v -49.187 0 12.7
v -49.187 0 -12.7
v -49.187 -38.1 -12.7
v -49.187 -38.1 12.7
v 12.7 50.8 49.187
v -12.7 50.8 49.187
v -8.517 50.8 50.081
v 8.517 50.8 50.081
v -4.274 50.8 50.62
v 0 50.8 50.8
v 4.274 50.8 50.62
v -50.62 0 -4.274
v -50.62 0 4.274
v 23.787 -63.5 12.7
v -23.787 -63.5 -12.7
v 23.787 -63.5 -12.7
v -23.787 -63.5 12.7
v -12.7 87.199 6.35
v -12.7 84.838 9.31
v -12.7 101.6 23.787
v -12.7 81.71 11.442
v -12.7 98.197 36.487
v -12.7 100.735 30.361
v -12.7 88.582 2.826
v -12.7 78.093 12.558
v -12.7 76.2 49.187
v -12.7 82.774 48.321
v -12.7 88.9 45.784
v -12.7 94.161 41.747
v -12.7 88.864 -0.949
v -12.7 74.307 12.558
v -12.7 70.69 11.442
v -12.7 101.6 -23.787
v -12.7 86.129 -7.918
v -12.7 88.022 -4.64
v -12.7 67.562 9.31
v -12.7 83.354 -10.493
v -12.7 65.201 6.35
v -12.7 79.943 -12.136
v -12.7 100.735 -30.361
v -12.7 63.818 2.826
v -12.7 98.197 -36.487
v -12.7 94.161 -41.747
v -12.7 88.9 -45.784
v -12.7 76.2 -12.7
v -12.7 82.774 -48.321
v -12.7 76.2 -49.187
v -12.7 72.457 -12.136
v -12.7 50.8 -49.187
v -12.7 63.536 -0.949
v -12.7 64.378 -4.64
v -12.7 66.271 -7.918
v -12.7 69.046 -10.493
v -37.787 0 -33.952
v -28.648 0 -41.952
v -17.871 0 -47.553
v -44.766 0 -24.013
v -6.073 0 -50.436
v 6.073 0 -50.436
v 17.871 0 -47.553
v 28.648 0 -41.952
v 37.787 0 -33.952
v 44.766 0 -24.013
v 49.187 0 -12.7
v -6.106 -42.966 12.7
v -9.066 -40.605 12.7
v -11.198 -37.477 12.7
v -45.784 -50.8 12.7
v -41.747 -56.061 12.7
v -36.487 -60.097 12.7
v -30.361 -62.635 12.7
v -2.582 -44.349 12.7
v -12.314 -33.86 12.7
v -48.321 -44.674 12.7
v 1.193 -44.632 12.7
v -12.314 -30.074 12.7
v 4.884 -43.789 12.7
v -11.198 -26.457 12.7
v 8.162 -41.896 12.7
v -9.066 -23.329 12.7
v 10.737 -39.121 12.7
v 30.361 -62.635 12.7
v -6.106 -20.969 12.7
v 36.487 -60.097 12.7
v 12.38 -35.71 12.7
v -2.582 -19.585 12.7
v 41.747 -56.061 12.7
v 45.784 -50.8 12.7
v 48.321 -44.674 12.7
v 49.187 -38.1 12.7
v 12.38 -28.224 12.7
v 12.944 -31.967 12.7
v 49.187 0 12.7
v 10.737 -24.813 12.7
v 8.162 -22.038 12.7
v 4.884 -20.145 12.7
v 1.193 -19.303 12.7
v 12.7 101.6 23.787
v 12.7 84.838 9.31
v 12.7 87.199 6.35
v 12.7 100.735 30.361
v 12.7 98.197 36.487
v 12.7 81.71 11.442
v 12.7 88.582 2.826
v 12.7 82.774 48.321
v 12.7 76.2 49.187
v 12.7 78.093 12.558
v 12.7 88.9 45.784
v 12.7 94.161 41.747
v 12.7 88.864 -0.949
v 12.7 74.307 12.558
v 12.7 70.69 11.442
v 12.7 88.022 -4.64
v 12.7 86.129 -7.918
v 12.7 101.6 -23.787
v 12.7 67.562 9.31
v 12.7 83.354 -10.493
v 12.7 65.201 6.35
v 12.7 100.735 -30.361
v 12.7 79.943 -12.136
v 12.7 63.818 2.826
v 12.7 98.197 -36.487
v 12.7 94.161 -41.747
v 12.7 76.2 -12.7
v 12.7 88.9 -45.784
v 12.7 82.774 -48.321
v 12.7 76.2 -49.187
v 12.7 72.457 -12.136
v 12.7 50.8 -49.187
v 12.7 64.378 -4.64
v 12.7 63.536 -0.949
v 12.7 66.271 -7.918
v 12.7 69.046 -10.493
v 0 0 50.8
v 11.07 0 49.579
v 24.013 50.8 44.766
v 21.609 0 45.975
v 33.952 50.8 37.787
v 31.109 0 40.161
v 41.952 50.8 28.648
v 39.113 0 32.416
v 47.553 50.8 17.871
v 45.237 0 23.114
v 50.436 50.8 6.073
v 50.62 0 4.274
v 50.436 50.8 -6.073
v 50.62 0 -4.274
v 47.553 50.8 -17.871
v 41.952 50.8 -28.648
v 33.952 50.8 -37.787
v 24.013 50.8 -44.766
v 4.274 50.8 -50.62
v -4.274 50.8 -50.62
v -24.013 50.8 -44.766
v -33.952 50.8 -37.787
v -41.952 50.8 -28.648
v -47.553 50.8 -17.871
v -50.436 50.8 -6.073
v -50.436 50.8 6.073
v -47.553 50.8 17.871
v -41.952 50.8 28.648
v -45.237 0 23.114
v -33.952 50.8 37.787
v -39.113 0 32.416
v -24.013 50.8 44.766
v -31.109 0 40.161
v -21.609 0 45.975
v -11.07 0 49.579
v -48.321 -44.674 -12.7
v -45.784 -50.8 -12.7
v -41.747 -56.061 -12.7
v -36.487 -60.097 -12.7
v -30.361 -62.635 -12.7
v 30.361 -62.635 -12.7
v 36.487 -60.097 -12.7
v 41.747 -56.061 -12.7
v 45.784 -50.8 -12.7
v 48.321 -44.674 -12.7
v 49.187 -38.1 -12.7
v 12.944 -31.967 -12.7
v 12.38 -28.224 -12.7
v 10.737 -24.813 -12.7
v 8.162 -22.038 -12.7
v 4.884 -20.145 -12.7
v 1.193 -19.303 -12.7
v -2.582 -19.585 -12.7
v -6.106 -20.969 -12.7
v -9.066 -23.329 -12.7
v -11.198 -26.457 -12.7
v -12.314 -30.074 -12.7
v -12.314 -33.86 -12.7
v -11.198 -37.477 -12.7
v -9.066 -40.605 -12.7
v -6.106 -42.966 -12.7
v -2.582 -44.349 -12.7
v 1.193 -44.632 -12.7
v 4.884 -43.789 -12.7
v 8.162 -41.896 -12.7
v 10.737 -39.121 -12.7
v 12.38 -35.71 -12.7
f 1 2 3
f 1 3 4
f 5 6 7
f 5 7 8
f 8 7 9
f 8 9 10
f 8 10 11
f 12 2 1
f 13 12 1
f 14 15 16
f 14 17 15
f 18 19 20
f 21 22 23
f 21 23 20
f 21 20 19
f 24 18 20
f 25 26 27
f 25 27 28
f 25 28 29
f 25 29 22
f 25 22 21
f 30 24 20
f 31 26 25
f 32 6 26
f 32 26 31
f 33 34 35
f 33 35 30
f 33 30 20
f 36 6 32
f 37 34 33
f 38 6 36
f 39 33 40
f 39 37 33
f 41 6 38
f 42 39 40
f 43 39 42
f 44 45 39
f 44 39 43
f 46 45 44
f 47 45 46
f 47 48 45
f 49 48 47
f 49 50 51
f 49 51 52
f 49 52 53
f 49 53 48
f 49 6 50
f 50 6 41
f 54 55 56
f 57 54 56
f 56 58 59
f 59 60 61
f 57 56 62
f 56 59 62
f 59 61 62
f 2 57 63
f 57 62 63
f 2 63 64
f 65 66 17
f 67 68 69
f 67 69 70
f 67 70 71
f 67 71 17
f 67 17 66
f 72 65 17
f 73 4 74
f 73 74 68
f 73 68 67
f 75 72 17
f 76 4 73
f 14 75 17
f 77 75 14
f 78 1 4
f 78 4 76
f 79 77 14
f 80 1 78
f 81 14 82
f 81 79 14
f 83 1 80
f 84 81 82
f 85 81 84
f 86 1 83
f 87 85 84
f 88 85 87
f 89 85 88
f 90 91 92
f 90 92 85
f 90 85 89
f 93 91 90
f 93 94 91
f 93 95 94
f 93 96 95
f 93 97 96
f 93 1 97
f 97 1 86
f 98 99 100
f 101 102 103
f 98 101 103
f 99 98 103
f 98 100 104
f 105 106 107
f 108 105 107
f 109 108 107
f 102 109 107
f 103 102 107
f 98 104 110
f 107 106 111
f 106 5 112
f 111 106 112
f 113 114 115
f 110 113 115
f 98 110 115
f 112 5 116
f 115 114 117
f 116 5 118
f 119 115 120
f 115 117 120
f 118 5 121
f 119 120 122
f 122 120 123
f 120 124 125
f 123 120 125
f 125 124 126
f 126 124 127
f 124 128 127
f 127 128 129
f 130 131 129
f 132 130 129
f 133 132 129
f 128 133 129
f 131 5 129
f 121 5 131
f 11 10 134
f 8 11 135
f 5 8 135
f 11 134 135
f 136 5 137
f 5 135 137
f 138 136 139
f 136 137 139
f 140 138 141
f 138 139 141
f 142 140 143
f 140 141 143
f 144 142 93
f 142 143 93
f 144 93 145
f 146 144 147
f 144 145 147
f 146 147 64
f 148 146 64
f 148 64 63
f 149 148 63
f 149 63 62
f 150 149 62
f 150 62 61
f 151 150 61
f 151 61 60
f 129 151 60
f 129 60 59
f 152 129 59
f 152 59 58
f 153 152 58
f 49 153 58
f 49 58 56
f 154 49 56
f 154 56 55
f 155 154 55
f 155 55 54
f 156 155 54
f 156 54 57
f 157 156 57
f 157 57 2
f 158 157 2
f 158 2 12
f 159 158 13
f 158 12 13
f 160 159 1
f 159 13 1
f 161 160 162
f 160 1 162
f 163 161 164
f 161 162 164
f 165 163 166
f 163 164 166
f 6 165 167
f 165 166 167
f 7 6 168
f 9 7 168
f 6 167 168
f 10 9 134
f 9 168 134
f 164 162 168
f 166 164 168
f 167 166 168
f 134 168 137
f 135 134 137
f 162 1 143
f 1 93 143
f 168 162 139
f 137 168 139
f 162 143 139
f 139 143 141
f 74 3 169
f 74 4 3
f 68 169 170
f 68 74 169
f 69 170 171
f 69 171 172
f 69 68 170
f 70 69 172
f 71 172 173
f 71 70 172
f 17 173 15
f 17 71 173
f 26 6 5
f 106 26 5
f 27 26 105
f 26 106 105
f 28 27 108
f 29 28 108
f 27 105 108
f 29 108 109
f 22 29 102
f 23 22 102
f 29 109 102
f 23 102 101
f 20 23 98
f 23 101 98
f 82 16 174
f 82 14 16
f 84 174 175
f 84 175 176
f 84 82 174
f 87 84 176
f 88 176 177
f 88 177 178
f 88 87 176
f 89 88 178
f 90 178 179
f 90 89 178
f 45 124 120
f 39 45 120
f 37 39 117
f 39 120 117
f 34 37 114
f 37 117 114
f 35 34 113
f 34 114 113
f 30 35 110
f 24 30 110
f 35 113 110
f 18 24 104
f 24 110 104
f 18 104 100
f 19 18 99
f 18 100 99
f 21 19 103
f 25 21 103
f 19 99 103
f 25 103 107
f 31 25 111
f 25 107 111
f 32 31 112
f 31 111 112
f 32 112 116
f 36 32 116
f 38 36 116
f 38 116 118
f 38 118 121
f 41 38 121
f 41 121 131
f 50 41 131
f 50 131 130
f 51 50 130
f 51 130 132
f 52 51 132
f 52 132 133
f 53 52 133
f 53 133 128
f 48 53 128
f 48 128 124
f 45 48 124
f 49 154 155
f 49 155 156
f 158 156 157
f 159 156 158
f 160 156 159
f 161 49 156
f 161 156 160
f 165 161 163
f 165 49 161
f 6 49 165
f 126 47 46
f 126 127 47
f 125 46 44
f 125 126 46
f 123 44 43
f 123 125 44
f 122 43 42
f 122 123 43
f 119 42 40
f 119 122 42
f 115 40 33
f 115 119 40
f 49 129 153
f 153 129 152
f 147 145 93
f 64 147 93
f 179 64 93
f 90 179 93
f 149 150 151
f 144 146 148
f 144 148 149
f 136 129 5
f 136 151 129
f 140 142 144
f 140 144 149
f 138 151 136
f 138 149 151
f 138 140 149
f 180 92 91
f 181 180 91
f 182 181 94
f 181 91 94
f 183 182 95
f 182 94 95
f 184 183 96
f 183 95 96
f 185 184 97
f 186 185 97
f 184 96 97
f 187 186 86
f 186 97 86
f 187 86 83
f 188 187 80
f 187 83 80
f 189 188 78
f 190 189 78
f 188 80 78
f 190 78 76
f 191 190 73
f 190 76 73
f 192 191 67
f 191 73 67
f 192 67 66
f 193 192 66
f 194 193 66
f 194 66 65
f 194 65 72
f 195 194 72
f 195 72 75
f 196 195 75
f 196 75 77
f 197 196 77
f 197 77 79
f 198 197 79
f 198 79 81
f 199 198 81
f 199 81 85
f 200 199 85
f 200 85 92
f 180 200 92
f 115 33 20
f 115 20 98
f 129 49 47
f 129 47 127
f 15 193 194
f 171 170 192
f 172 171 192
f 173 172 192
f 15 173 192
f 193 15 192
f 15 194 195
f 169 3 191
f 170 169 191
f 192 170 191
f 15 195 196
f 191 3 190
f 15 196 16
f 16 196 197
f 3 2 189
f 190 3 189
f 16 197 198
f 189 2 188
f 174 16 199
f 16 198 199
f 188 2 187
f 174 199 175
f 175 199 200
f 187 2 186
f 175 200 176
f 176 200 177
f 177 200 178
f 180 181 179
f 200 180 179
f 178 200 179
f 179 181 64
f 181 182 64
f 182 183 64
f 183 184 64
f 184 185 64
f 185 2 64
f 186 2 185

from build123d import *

# Parameters (mm, degrees)
SKETCH1_R           = 50.8
BOSS_EXTRUDE1_DEPTH = 50.8
SKETCH3_W           = 98.373776994
SKETCH3_H           = 25.4
BOSS_EXTRUDE3_DEPTH = 63.5
SKETCH4_R           = 12.7
CUT_EXTRUDE1_DEPTH  = 104.175287739
FILLET1_R           = 25.4
FILLET2_R           = 25.4
SKETCH5_W           = 25.4
SKETCH5_H           = 98.373776994
BOSS_EXTRUDE4_DEPTH = 50.8
SKETCH6_R           = 12.7
CUT_EXTRUDE2_DEPTH  = 50.8
FILLET3_R           = 25.4


with BuildPart() as part:
    # Sketch1 → Boss-Extrude1 (new body)
    with BuildSketch(Plane(origin=(0, 0, 0), x_dir=(1, 0, 0), z_dir=(0, 1, 0))):
        with Locations(Location((0, 0, 0), (0, 0, 270))):
            Circle(SKETCH1_R)
    extrude(amount=BOSS_EXTRUDE1_DEPTH)

    # Sketch3 → Boss-Extrude3 (add)
    with BuildSketch(Plane.XZ):
        Rectangle(SKETCH3_W, SKETCH3_H)
    extrude(amount=BOSS_EXTRUDE3_DEPTH)

    # Sketch4 → Cut-Extrude1 (cut, through all)
    with BuildSketch(Plane.XY.offset(12.7)):
        with Locations((0.243990196, -31.967064289)):
            Circle(SKETCH4_R)
    extrude(amount=-CUT_EXTRUDE1_DEPTH, mode=Mode.SUBTRACT)

    # Fillet1
    fillet1_edges = [part.edges().sort_by_distance(p)[0] for p in [
        (-49.186888497, -63.5, 0),
    ]]
    fillet(fillet1_edges, radius=FILLET1_R)

    # Fillet2
    fillet2_edges = [part.edges().sort_by_distance(p)[0] for p in [
        (49.186888497, -63.5, 0),
    ]]
    fillet(fillet2_edges, radius=FILLET2_R)

    # Sketch5 → Boss-Extrude4 (add)
    with BuildSketch(Plane(origin=(0, 50.8, 0), x_dir=(1, 0, 0), z_dir=(0, 1, 0))):
        Rectangle(SKETCH5_W, SKETCH5_H)
    extrude(amount=BOSS_EXTRUDE4_DEPTH)

    # Sketch6 → Cut-Extrude2 (cut)
    with BuildSketch(Plane(origin=(12.7, 0, 0), x_dir=(0, 0, -1), z_dir=(1, 0, 0))):
        with Locations((0, 76.2)):
            Circle(SKETCH6_R)
    extrude(amount=-CUT_EXTRUDE2_DEPTH, mode=Mode.SUBTRACT)

    # Fillet3
    fillet3_edges = [part.edges().sort_by_distance(p)[0] for p in [
        (0, 101.6, -49.186888497),
        (0, 101.6, 49.186888497),
    ]]
    fillet(fillet3_edges, radius=FILLET3_R)


solid = part.part
